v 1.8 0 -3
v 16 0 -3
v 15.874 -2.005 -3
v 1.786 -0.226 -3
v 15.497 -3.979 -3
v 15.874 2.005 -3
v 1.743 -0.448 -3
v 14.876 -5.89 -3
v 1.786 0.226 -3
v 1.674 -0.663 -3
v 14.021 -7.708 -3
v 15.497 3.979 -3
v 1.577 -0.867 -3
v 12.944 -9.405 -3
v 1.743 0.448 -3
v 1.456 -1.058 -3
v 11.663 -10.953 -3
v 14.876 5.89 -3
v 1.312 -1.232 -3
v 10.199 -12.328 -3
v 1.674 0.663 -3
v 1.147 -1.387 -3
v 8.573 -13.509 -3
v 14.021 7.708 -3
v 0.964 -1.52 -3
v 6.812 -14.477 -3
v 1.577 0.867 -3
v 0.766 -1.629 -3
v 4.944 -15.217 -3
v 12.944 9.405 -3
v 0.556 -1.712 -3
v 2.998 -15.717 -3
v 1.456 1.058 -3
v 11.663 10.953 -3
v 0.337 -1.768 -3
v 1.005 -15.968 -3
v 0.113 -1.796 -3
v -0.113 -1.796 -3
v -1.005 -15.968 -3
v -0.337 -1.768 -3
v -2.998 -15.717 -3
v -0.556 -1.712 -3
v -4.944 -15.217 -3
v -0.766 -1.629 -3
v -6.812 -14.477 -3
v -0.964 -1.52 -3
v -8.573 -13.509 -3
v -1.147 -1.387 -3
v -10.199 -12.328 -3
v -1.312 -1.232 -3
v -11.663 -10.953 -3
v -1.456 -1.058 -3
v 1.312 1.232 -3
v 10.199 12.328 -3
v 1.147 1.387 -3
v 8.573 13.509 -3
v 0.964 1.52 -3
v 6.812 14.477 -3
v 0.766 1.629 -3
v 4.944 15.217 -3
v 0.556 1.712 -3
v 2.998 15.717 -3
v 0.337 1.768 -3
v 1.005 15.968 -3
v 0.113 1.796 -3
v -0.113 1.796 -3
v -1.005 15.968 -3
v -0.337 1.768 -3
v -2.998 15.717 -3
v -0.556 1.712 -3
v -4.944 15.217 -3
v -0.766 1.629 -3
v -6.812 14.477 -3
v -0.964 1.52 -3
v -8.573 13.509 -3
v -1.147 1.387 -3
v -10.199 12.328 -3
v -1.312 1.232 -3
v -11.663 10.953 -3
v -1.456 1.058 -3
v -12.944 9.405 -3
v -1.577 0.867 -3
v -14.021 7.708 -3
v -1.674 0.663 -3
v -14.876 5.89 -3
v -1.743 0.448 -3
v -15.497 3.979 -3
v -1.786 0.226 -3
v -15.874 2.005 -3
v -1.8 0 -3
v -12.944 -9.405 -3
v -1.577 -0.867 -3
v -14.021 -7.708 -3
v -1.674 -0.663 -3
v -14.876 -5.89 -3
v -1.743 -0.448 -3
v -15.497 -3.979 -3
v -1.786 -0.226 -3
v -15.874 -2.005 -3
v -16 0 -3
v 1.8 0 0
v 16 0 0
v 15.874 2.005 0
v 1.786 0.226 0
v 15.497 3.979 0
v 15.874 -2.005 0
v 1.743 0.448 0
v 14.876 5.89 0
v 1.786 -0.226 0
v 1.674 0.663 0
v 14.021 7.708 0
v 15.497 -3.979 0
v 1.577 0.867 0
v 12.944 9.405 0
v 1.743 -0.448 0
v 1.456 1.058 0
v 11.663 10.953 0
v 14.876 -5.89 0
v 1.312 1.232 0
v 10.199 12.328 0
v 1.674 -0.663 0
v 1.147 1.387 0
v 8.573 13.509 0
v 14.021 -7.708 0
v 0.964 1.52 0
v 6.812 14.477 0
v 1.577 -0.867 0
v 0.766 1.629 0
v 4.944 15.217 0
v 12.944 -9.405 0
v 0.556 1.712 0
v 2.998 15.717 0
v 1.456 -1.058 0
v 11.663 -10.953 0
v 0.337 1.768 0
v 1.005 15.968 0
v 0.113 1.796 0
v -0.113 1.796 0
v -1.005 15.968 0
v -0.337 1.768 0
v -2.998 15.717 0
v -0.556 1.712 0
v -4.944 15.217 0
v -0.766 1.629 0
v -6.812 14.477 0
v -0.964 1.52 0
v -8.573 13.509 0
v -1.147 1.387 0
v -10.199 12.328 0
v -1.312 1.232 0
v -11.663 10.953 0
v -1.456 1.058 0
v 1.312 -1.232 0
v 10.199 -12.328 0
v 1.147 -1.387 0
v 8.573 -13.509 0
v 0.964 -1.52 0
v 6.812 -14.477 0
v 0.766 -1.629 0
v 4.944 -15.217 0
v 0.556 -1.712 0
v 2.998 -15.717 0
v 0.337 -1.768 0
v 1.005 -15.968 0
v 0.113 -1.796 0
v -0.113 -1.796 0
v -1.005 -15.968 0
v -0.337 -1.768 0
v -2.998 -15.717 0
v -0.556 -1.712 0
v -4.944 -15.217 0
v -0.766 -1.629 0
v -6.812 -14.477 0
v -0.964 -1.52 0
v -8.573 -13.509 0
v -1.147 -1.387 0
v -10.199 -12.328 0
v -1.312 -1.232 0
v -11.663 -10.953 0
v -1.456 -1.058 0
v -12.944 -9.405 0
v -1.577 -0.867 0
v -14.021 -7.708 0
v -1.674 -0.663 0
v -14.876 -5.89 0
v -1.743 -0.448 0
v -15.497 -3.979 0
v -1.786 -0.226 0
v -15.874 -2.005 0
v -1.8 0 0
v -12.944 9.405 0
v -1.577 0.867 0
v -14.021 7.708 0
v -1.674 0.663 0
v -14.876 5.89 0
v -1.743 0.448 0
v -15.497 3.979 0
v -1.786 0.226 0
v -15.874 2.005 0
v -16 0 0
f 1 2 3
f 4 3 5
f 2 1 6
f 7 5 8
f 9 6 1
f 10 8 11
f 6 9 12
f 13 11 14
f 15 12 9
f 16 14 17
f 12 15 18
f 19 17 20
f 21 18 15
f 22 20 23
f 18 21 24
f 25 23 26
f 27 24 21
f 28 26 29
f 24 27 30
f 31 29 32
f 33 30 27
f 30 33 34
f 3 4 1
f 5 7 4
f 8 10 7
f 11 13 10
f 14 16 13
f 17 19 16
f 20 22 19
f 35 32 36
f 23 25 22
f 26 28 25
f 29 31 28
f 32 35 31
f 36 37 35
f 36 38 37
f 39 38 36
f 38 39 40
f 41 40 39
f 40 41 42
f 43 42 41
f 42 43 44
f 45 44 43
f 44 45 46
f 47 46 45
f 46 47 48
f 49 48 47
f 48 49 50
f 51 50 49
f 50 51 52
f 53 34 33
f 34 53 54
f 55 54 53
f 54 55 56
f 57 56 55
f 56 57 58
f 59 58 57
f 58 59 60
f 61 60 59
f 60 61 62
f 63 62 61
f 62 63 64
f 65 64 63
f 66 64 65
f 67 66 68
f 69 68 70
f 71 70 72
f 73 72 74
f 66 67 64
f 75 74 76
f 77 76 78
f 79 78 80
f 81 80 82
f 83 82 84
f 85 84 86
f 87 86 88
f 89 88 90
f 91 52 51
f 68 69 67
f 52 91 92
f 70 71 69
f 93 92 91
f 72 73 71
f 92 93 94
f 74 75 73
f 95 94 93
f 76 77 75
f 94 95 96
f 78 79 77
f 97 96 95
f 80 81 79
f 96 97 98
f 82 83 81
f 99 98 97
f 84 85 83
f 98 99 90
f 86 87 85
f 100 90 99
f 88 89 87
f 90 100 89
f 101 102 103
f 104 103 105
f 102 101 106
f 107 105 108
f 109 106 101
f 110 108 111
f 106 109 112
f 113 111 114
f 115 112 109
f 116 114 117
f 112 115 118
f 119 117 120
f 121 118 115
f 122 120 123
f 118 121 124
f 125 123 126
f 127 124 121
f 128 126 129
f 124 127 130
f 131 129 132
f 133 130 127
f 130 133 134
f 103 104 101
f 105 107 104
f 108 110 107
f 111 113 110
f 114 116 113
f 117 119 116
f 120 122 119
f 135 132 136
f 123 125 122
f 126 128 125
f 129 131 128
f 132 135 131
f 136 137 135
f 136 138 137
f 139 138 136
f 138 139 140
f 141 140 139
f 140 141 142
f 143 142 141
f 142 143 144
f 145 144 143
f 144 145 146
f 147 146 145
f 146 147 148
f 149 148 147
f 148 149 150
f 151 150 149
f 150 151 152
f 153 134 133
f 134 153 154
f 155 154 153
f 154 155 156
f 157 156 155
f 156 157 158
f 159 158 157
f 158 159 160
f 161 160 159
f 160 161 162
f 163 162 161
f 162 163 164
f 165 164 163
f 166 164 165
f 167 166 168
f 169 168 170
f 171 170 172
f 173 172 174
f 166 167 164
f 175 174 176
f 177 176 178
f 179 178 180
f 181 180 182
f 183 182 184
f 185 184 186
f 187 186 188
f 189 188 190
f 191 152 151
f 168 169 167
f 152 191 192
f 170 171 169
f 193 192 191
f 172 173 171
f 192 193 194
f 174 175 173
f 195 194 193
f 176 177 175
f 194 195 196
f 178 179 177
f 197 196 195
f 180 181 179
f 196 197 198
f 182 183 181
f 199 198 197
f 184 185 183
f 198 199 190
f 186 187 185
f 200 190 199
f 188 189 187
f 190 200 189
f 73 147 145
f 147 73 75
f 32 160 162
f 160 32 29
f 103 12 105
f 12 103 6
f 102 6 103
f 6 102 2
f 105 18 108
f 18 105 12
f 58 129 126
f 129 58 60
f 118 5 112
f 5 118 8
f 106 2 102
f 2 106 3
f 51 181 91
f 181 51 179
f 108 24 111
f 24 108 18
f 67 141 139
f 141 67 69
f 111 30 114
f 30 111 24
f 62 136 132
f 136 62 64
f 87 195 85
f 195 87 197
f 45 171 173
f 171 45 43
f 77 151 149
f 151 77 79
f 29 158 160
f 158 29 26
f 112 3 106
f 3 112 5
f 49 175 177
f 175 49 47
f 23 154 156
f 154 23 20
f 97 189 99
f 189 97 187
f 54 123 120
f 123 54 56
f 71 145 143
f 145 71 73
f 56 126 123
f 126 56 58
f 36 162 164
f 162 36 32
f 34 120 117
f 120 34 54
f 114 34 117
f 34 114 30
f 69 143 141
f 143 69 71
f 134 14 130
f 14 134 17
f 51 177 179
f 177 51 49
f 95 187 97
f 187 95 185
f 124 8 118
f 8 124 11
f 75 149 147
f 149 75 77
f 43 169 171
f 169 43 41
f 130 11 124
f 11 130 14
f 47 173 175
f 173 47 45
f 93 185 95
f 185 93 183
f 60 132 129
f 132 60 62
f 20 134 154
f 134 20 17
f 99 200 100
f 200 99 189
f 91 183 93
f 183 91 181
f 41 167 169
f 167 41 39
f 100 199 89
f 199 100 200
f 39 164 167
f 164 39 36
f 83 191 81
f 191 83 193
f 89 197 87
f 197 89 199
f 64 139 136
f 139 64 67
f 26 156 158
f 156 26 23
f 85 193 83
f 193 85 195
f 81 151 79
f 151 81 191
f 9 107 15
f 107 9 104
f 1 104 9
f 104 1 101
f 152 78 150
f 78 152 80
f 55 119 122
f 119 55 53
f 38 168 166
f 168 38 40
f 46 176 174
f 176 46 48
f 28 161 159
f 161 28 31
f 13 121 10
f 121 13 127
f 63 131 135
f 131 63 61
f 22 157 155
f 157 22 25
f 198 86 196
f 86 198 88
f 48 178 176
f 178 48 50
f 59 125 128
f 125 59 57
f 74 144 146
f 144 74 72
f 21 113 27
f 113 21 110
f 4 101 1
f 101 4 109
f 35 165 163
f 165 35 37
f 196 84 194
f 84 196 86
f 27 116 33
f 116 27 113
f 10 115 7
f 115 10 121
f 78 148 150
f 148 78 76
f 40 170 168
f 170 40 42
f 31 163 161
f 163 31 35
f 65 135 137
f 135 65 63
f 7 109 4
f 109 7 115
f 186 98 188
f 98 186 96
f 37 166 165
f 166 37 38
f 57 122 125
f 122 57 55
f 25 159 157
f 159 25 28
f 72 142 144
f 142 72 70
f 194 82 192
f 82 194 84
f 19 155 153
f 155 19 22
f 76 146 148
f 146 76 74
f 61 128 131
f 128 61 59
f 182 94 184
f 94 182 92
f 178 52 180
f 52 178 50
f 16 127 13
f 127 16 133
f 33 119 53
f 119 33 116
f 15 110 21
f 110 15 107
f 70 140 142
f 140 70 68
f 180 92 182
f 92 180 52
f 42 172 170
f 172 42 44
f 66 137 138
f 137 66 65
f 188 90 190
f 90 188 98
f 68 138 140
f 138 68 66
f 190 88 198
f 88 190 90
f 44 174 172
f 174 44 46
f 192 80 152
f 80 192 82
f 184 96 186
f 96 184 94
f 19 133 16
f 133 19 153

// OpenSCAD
$fn = 50;


difference() {
	union() {
		translate(v = [0, 0, -3.0000000000]) {
			cylinder(h = 3, r = 10.0000000000);
		}
		translate(v = [0, 0, -3.0000000000]) {
			cylinder(h = 3, r = 16.0000000000);
		}
	}
	union() {
		#translate(v = [0, 0, -3]) {
			cylinder(h = 3, r = 1.8000000000);
		}
	}
}
